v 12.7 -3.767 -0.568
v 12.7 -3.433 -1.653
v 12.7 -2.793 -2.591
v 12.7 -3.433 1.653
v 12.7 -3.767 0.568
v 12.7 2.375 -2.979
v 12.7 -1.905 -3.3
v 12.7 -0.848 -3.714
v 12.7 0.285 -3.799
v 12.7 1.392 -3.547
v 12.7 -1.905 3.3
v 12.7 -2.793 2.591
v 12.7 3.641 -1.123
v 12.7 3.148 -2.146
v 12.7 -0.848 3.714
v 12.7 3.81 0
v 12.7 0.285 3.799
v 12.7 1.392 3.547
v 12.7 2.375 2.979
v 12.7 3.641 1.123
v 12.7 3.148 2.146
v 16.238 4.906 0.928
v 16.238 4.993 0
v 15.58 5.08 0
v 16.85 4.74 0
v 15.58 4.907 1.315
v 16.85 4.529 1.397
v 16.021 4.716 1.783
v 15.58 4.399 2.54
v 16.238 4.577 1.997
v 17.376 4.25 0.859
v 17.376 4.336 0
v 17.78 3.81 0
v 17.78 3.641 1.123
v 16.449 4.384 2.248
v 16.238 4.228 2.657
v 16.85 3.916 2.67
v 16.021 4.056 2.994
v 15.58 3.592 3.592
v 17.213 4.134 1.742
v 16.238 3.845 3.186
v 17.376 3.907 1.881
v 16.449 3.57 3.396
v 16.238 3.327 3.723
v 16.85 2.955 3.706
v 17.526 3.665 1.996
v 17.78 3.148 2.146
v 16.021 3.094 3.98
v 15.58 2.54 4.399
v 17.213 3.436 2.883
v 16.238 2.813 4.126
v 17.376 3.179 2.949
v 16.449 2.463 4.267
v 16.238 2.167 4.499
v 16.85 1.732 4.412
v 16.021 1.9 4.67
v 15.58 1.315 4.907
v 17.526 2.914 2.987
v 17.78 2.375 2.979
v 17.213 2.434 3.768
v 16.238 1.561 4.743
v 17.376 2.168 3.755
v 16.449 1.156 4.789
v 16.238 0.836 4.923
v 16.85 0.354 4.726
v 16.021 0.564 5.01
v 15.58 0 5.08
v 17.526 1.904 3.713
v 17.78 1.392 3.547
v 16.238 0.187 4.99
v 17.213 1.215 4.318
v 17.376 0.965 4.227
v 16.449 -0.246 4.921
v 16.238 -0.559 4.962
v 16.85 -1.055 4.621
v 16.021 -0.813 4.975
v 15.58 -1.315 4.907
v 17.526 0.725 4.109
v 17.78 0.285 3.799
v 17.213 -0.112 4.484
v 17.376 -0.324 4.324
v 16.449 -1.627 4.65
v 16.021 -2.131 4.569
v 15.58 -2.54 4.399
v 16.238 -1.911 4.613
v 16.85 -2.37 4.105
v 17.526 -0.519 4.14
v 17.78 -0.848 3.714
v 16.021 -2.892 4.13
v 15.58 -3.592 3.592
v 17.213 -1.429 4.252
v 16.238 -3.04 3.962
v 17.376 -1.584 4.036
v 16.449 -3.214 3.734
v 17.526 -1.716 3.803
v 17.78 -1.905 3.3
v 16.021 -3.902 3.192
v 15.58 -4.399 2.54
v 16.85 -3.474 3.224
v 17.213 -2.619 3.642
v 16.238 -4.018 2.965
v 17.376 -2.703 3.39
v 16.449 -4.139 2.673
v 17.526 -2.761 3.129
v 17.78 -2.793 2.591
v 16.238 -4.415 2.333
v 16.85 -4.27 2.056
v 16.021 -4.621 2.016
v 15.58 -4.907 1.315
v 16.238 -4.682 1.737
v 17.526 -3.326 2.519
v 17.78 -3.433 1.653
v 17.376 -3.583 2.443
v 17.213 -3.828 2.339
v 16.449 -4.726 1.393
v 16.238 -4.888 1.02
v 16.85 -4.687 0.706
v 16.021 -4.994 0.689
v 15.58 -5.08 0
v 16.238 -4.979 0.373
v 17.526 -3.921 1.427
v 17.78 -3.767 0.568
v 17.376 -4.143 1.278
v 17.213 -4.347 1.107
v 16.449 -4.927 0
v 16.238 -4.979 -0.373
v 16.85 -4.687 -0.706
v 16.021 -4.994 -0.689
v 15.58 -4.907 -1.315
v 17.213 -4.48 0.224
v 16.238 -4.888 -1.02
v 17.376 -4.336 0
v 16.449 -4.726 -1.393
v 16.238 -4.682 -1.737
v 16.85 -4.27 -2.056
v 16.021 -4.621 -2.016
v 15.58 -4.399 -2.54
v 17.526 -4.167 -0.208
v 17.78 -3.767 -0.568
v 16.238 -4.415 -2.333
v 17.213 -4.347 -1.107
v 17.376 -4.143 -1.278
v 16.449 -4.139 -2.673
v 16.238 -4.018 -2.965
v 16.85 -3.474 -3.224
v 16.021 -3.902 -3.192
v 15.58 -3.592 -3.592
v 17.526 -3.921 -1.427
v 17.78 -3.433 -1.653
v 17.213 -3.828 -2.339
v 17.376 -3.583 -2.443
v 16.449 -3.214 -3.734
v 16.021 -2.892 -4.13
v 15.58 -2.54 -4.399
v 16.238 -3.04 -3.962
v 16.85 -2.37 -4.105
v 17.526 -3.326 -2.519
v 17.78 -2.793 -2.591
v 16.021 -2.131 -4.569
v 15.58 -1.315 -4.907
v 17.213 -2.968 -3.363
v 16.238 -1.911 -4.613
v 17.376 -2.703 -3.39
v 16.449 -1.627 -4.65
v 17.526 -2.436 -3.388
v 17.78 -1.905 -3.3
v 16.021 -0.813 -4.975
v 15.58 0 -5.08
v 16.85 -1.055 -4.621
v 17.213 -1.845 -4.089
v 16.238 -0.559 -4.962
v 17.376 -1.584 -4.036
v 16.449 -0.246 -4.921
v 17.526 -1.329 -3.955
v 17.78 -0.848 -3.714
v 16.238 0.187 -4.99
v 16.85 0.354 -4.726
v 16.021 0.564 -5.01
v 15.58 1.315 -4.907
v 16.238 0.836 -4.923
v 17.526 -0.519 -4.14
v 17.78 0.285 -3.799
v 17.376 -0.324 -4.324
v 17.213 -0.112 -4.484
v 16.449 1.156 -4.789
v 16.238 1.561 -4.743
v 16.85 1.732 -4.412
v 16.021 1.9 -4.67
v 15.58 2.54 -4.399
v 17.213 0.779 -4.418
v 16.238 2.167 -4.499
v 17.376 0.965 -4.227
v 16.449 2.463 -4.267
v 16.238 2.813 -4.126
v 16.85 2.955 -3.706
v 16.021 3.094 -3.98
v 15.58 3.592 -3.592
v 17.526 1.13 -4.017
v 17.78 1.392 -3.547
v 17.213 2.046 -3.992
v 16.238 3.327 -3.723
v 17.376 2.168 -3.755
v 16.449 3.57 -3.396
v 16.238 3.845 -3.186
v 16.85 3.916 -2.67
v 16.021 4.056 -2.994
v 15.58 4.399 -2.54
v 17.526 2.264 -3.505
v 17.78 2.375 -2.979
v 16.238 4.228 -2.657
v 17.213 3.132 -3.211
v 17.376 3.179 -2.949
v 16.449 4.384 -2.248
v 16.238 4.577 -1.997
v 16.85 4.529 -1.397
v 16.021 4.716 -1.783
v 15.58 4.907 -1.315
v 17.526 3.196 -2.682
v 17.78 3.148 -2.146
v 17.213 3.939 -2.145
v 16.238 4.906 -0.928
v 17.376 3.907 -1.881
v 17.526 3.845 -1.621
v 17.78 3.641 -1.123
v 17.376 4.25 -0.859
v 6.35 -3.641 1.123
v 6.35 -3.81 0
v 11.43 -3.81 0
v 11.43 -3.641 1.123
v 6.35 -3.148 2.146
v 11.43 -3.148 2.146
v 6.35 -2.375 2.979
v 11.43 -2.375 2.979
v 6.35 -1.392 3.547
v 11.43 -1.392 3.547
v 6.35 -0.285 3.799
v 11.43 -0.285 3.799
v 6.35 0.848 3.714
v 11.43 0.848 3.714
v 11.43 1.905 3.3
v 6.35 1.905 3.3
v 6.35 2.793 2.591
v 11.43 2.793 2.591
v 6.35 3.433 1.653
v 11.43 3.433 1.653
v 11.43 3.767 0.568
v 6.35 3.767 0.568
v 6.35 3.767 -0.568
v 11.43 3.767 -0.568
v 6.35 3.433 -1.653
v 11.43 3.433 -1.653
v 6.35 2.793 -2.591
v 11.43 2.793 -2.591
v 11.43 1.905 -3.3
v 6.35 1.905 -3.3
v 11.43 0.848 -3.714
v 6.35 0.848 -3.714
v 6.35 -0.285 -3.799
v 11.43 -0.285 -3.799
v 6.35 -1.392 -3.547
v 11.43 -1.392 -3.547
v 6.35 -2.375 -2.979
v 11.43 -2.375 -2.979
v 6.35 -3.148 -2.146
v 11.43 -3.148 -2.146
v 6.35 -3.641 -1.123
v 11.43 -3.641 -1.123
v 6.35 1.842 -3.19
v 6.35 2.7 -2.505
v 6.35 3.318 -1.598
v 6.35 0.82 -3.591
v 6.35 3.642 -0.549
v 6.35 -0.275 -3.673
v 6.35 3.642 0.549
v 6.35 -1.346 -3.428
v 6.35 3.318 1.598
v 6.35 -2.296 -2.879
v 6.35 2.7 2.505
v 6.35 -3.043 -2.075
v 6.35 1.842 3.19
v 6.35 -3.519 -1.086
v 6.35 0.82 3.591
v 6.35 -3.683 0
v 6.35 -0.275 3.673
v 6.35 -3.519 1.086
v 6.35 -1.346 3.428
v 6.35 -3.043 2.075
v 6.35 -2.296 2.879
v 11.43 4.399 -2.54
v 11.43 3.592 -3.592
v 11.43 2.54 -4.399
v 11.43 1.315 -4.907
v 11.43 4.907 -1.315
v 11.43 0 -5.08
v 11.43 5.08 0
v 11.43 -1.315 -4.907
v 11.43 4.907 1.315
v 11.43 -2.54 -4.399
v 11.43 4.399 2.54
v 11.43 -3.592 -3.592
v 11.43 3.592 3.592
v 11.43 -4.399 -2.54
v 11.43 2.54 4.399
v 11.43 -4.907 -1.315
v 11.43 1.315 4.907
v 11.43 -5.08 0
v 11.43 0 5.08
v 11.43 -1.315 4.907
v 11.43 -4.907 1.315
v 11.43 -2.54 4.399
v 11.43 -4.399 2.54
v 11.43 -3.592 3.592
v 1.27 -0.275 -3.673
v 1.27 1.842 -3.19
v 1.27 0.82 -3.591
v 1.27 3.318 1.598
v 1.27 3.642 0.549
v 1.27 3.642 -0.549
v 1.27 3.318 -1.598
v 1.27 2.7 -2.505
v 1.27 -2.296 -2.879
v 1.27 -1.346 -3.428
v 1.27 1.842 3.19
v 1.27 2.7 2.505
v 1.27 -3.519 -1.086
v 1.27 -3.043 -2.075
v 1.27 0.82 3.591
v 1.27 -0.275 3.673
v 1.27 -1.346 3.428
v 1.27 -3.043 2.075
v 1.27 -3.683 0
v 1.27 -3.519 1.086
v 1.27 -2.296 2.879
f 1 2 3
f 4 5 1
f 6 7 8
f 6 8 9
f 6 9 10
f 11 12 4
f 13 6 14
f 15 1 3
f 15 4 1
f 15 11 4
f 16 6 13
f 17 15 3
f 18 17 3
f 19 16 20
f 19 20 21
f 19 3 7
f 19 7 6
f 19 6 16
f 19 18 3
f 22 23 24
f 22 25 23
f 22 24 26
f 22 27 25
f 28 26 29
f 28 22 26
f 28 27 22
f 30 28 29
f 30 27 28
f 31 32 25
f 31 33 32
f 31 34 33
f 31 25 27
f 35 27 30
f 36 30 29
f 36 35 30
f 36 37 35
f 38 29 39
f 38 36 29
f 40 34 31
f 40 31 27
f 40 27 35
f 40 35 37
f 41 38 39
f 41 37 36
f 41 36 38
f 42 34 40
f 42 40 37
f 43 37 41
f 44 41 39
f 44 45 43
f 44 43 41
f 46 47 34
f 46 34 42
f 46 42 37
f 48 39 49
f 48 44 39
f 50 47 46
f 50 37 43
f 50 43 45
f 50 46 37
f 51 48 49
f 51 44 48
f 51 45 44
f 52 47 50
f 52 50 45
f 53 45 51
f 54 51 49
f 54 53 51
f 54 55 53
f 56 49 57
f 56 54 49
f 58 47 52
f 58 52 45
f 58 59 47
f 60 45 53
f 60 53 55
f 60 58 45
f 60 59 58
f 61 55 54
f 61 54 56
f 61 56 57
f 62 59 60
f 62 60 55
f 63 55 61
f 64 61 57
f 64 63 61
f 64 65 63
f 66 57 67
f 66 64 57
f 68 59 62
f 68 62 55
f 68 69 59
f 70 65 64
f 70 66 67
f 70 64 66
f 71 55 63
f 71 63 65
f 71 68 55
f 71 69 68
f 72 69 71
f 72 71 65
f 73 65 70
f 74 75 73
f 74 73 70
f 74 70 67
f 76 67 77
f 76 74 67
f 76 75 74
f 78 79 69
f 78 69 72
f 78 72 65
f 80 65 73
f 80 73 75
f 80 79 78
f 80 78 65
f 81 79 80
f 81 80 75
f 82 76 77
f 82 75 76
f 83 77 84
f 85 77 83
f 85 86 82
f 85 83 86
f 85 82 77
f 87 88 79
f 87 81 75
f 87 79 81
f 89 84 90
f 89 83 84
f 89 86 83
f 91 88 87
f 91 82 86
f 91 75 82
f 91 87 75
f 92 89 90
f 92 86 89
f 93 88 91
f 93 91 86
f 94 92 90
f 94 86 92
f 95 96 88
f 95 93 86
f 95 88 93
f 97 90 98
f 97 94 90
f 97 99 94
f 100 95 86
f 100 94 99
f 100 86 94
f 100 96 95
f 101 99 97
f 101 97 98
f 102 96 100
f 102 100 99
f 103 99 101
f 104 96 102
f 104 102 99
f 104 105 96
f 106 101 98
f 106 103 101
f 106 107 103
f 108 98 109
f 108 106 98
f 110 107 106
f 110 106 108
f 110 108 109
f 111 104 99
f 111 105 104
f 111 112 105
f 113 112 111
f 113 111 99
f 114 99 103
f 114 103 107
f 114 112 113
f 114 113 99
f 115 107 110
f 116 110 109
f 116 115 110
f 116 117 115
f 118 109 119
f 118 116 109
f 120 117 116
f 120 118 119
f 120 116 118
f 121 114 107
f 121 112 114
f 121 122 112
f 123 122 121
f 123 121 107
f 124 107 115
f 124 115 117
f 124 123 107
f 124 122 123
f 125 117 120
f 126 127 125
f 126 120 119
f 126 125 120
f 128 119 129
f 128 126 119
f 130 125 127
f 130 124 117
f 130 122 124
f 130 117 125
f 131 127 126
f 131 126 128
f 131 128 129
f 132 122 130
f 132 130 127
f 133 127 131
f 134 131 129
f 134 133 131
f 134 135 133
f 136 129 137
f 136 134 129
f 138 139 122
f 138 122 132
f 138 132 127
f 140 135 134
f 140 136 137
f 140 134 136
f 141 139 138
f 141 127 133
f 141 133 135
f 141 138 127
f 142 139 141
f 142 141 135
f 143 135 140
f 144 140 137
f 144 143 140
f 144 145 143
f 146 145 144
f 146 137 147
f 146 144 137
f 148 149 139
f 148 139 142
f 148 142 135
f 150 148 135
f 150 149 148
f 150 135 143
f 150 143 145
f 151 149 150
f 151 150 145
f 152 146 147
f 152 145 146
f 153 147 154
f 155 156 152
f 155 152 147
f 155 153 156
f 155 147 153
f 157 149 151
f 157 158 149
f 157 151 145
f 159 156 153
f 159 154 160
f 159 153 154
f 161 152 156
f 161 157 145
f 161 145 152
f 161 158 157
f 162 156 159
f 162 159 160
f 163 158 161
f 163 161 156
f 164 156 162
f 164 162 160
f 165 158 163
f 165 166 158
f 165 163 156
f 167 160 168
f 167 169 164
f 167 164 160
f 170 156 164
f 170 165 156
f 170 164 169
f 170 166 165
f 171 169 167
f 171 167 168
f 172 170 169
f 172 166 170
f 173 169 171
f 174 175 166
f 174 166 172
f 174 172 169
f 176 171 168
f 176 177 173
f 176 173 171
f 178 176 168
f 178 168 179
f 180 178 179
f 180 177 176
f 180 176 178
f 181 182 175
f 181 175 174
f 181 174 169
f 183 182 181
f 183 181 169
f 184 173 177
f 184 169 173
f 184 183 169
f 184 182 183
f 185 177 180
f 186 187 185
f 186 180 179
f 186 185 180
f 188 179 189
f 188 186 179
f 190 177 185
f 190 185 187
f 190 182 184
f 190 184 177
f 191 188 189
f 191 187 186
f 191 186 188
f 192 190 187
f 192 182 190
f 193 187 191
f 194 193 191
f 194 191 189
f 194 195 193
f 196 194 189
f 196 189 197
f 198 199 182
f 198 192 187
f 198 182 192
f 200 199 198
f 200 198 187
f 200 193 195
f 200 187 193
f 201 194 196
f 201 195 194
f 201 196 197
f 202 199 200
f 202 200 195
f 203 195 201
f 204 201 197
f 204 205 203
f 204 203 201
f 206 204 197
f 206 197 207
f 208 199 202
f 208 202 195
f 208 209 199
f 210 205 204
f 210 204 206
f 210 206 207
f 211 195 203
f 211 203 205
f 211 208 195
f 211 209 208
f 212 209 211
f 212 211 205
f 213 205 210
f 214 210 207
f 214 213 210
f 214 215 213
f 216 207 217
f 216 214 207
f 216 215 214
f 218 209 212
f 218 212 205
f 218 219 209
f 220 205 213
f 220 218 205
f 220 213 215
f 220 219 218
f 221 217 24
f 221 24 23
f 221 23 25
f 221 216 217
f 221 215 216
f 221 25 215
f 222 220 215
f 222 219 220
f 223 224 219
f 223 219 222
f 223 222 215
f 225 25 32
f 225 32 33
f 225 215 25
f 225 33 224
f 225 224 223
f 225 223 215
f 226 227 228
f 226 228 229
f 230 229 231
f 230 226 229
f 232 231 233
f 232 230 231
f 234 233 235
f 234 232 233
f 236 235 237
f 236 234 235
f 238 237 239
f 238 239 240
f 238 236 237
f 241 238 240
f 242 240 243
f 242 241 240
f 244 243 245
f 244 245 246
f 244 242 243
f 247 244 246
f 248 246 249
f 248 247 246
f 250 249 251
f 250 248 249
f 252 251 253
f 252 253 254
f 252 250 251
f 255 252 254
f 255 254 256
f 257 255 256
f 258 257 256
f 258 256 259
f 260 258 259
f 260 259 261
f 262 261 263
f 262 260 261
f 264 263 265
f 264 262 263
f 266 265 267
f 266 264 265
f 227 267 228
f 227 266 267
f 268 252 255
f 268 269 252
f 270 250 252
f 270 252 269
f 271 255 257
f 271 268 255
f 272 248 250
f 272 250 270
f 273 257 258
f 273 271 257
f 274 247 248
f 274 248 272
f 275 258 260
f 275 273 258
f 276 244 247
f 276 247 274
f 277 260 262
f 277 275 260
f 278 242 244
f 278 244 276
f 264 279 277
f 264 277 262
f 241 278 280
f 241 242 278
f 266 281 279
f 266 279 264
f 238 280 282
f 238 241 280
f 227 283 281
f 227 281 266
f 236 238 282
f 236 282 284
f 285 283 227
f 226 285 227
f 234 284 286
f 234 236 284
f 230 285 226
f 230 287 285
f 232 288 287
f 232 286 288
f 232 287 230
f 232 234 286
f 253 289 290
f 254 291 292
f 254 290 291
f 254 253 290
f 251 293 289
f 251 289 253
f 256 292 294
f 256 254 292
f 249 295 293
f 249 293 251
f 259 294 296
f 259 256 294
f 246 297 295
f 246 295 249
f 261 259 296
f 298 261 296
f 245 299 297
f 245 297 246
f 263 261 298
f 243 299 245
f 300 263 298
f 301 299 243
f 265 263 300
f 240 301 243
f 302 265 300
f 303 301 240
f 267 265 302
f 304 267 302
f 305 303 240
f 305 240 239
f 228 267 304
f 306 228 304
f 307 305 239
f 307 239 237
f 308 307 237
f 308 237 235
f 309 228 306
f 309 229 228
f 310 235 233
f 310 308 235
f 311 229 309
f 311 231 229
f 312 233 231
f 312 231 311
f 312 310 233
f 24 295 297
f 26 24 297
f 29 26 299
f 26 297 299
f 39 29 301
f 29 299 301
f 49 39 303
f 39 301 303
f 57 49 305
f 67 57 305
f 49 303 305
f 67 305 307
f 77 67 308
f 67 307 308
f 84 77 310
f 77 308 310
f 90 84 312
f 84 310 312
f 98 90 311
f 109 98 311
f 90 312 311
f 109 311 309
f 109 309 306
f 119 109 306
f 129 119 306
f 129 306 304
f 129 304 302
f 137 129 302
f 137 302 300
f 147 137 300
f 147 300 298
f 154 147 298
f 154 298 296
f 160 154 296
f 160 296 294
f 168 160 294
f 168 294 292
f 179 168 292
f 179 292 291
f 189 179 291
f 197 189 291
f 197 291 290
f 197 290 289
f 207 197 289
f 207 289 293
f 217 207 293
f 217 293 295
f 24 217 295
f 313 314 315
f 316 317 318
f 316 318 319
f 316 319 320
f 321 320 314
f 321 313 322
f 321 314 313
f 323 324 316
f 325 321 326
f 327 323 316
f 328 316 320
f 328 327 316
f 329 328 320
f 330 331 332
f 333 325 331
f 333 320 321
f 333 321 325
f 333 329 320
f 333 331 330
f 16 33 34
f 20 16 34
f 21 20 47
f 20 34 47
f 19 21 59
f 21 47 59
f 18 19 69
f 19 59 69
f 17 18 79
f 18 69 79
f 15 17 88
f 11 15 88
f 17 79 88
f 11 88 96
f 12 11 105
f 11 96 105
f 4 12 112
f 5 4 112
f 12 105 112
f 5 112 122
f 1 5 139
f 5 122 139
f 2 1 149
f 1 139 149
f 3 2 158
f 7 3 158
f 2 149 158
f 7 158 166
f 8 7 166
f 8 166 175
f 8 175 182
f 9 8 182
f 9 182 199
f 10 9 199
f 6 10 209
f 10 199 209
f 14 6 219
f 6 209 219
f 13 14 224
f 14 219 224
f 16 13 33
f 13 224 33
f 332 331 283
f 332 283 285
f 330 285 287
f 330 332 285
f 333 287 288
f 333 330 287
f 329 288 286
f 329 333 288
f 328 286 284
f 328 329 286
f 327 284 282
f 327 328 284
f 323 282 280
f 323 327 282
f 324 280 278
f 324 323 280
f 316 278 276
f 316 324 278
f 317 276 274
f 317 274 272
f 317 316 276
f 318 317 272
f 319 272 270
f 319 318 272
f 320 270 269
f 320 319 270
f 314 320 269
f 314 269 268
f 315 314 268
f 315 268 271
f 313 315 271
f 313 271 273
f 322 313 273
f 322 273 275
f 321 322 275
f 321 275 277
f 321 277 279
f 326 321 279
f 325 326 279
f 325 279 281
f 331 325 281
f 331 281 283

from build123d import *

# Parameters (mm, degrees)
F0_R     = 5.08
F1_DEPTH = 17.78
F2_R     = 5.08
F2_R_2   = 3.683
F3_DEPTH = 6.35
F4_R     = 5.08
F4_R_2   = 3.81
F5_DEPTH = 5.08
F6_R     = 3.81
F7_DEPTH = 5.08
F8_R     = 3.683
F9_DEPTH = 1.27


# Not quite as in the source:
# - a fillet or chamfer that OpenCascade refuses, or shapes differently, is made with other operations: its cross-section is extruded or revolved along the edge and cut away or added


with BuildPart() as f1:
    # F0 (on Right) → F1 (new body)
    with BuildSketch(Plane.YZ):
        Circle(F0_R)
    extrude(amount=F1_DEPTH)

    # F2 (on face) → F3 (cut)
    with BuildSketch(Plane(origin=(0, 0, 0), x_dir=(0, -1, 0), z_dir=(-1, 0, 0))):
        Circle(F2_R)
        Circle(F2_R_2, mode=Mode.SUBTRACT)
    extrude(amount=-F3_DEPTH, mode=Mode.SUBTRACT)

    # F4 (on face) → F5 (cut)
    with BuildSketch(Plane(origin=(6.35, 0, 0), x_dir=(0, -1, 0), z_dir=(-1, 0, 0))):
        Circle(F4_R)
        Circle(F4_R_2, mode=Mode.SUBTRACT)
    extrude(amount=-F5_DEPTH, mode=Mode.SUBTRACT)

    # F6 (on face) → F7 (cut)
    with BuildSketch(Plane.YZ.offset(17.78)):
        Circle(F6_R)
    extrude(amount=-F7_DEPTH, mode=Mode.SUBTRACT)

    # F8 (on face) → F9 (cut)
    with BuildSketch(Plane(origin=(0, 0, 0), x_dir=(0, -1, 0), z_dir=(-1, 0, 0))):
        Circle(F8_R)
    extrude(amount=-F9_DEPTH, mode=Mode.SUBTRACT)

    # F10: fillet of radius 2.54 on 1 edges, made by hand

    # F10_s1 → F10_t2 (revolve, cut)
    with BuildSketch(Plane.XY):
        with BuildLine():
            ThreePointArc((15.5802954744, 5.08), (16.8502954744, 4.7397045256), (17.78, 3.81))
            Line((17.78, 3.81), (17.78, 5.08))
            Line((17.78, 5.08), (15.5802954744, 5.08))
        make_face()
    revolve(axis=Axis((17.78, 0, 0), (1, 0, 0)), mode=Mode.SUBTRACT)


solid = f1.part
